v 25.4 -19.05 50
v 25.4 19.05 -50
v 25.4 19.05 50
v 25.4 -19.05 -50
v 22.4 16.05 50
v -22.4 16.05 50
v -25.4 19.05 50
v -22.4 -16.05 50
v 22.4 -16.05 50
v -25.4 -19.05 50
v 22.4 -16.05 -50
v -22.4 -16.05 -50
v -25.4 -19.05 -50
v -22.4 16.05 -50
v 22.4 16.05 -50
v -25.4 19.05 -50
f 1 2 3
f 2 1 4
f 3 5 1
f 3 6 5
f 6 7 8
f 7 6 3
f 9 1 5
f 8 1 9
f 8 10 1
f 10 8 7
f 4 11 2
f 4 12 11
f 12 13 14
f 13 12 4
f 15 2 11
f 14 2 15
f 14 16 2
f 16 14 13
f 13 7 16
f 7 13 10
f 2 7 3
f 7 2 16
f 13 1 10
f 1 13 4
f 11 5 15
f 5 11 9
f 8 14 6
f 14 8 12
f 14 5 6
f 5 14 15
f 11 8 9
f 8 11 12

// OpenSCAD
$fn=64;

outer_w = 50.8;
outer_h = 38.1;
wall = 3.0;
len = 100;

inner_w = outer_w - 2*wall;
inner_h = outer_h - 2*wall;

module box_section(w, h, t, l) {
    difference() {
        cube([w, h, l], center=true);
        cube([w-2*t, h-2*t, l+0.2], center=true);
    }
}

box_section(outer_w, outer_h, wall, len);
